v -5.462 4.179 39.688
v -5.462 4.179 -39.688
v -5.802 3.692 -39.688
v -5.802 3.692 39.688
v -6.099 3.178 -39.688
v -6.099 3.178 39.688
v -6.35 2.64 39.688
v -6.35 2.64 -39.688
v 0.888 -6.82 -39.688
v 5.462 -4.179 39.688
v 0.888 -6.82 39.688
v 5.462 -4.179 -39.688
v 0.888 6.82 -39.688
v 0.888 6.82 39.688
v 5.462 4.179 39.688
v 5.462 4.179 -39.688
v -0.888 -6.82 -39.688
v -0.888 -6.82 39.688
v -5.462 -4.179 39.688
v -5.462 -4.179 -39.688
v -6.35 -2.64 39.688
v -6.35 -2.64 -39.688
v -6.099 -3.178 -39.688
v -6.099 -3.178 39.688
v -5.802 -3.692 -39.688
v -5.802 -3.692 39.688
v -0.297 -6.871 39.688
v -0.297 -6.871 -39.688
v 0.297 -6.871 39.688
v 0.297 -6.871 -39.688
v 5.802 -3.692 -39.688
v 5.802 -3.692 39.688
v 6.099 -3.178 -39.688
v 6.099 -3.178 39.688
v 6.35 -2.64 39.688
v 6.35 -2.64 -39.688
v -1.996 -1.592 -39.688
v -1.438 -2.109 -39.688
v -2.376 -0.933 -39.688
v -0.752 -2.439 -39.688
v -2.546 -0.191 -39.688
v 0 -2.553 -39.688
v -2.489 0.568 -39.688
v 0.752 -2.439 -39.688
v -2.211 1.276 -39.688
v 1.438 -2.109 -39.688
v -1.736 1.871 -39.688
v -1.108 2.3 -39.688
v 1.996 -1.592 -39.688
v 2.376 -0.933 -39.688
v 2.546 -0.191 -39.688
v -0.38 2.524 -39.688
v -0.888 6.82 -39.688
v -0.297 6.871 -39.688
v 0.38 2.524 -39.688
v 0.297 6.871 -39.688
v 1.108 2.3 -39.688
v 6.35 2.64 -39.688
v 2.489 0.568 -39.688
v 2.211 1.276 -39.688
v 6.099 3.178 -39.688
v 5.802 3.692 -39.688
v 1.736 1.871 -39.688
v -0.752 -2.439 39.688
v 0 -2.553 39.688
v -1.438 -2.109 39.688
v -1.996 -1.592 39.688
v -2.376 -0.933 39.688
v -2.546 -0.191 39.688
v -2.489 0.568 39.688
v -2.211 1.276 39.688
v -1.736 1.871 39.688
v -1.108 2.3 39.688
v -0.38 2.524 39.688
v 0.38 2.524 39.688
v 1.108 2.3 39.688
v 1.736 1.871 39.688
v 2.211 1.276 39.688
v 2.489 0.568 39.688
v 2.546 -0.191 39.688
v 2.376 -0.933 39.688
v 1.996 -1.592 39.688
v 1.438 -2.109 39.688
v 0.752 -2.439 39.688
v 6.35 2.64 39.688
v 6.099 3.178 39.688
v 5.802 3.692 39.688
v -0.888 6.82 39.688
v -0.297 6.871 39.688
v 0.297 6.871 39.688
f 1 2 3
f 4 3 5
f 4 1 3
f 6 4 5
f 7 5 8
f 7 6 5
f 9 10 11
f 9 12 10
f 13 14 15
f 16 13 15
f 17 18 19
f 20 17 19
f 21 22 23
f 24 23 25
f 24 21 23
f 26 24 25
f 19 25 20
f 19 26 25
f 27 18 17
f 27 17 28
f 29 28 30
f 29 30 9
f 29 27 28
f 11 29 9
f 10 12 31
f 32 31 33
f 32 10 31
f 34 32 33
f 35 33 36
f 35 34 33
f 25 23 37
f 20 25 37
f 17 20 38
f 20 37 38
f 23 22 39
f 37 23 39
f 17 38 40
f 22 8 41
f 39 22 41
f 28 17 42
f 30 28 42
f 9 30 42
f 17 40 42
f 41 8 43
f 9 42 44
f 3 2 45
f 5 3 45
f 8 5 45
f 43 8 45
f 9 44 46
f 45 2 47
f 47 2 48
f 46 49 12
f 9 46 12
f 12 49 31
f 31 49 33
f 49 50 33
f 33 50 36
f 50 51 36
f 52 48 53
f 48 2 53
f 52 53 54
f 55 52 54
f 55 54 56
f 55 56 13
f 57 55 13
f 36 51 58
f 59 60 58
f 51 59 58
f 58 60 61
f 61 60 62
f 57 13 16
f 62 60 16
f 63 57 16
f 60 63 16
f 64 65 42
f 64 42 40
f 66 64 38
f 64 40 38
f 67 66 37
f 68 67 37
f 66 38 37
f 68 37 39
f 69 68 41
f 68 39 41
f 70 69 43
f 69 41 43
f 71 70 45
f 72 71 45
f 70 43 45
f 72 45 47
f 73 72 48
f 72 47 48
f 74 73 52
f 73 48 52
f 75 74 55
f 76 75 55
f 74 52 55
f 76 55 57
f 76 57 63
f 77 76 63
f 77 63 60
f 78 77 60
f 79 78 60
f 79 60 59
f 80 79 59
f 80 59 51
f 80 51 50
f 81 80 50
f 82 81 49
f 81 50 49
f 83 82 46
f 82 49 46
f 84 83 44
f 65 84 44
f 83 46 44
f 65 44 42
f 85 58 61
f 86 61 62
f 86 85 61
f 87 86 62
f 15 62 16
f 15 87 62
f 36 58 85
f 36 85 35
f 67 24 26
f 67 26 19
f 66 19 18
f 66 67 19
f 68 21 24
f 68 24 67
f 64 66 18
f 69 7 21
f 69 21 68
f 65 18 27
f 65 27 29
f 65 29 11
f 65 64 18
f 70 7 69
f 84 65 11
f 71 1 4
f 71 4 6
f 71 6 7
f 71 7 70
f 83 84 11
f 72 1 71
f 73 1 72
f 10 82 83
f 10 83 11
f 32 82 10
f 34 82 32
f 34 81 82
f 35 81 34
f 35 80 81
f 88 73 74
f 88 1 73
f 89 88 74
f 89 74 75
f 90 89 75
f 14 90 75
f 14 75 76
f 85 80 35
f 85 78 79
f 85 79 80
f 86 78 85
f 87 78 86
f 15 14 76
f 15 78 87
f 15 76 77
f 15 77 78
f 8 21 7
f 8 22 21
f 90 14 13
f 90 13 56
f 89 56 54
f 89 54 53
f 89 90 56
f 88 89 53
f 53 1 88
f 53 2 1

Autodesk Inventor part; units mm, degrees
ref_plane "YZ Plane" through (0, 0, 0) normal (1, 0, 0) x (0, 1, 0)
ref_plane "XZ Plane" through (0, 0, 0) normal (0, 1, 0) x (-1, 0, 0)
ref_plane "XY Plane" through (0, 0, 0) normal (0, 0, 1) x (1, 0, 0)
sketch "Sketch1" plane through (0, 0, 0) normal (0, 0, 1) x (1, 0, 0)
  line L0 (-6.35, -3.6662) -> (-6.35, 3.6662)
  line L1 (-6.35, 3.6662) -> (0, 7.3323)
  line L2 (0, 7.3323) -> (6.35, 3.6662)
  line L3 (6.35, 3.6662) -> (6.35, -3.6662)
  line L4 (6.35, -3.6662) -> (0, -7.3323)
  line L5 (0, -7.3323) -> (-6.35, -3.6662)
  point P0 (0, 0)
  point P1 (0, 0)
  dimension "Size" = 12.7
extrude "Extrusion1" add sketch "Sketch1" along normal mid plane 79.375
sketch "Sketch3" plane through (0, 0, 39.6875) normal (0, 0, 1) x (1, 0, 0)
  line L0 (-6.35, 3.6662) -> (0, 7.3323) construction
  line L1 (0, 7.3323) -> (6.35, 3.6662) construction
  line L2 (6.35, 3.6662) -> (6.35, -3.6662) construction
  line L3 (6.35, -3.6662) -> (0, -7.3323) construction
  line L4 (0, -7.3323) -> (-6.35, -3.6662) construction
  line L5 (-6.35, -3.6662) -> (-6.35, 3.6662) construction
  point P0 (0, 0)
hole "Hole1" at (0, 0, 39.6875) direction (0, 0, -1) diameter 5.1054 end through all
sketch "Sketch4" plane through (0, 0, 39.6875) normal (0, 0, 1) x (1, 0, 0)
  circle A0 centre (0, 0) radius 2.5527 construction
  line L0 (-6.35, 3.6662) -> (0, 7.3323) construction
  line L1 (0, 7.3323) -> (6.35, 3.6662) construction
  line L2 (6.35, 3.6662) -> (6.35, -3.6662) construction
  line L3 (6.35, -3.6662) -> (0, -7.3323) construction
  line L4 (0, -7.3323) -> (-6.35, -3.6662) construction
  line L5 (-6.35, -3.6662) -> (-6.35, 3.6662) construction
  circle A1 centre (0, 0) radius 6.8771
  circle A2 centre (0, 0) radius 8.89
  dimension "thunder" = 13.7541
  dimension "d16" = 17.78
extrude "Extrusion3" cut sketch "Sketch4" against normal through all
equation "\"bearing\" = 25.4"
properties part number "CL3-011" material "Aluminum 6061"
